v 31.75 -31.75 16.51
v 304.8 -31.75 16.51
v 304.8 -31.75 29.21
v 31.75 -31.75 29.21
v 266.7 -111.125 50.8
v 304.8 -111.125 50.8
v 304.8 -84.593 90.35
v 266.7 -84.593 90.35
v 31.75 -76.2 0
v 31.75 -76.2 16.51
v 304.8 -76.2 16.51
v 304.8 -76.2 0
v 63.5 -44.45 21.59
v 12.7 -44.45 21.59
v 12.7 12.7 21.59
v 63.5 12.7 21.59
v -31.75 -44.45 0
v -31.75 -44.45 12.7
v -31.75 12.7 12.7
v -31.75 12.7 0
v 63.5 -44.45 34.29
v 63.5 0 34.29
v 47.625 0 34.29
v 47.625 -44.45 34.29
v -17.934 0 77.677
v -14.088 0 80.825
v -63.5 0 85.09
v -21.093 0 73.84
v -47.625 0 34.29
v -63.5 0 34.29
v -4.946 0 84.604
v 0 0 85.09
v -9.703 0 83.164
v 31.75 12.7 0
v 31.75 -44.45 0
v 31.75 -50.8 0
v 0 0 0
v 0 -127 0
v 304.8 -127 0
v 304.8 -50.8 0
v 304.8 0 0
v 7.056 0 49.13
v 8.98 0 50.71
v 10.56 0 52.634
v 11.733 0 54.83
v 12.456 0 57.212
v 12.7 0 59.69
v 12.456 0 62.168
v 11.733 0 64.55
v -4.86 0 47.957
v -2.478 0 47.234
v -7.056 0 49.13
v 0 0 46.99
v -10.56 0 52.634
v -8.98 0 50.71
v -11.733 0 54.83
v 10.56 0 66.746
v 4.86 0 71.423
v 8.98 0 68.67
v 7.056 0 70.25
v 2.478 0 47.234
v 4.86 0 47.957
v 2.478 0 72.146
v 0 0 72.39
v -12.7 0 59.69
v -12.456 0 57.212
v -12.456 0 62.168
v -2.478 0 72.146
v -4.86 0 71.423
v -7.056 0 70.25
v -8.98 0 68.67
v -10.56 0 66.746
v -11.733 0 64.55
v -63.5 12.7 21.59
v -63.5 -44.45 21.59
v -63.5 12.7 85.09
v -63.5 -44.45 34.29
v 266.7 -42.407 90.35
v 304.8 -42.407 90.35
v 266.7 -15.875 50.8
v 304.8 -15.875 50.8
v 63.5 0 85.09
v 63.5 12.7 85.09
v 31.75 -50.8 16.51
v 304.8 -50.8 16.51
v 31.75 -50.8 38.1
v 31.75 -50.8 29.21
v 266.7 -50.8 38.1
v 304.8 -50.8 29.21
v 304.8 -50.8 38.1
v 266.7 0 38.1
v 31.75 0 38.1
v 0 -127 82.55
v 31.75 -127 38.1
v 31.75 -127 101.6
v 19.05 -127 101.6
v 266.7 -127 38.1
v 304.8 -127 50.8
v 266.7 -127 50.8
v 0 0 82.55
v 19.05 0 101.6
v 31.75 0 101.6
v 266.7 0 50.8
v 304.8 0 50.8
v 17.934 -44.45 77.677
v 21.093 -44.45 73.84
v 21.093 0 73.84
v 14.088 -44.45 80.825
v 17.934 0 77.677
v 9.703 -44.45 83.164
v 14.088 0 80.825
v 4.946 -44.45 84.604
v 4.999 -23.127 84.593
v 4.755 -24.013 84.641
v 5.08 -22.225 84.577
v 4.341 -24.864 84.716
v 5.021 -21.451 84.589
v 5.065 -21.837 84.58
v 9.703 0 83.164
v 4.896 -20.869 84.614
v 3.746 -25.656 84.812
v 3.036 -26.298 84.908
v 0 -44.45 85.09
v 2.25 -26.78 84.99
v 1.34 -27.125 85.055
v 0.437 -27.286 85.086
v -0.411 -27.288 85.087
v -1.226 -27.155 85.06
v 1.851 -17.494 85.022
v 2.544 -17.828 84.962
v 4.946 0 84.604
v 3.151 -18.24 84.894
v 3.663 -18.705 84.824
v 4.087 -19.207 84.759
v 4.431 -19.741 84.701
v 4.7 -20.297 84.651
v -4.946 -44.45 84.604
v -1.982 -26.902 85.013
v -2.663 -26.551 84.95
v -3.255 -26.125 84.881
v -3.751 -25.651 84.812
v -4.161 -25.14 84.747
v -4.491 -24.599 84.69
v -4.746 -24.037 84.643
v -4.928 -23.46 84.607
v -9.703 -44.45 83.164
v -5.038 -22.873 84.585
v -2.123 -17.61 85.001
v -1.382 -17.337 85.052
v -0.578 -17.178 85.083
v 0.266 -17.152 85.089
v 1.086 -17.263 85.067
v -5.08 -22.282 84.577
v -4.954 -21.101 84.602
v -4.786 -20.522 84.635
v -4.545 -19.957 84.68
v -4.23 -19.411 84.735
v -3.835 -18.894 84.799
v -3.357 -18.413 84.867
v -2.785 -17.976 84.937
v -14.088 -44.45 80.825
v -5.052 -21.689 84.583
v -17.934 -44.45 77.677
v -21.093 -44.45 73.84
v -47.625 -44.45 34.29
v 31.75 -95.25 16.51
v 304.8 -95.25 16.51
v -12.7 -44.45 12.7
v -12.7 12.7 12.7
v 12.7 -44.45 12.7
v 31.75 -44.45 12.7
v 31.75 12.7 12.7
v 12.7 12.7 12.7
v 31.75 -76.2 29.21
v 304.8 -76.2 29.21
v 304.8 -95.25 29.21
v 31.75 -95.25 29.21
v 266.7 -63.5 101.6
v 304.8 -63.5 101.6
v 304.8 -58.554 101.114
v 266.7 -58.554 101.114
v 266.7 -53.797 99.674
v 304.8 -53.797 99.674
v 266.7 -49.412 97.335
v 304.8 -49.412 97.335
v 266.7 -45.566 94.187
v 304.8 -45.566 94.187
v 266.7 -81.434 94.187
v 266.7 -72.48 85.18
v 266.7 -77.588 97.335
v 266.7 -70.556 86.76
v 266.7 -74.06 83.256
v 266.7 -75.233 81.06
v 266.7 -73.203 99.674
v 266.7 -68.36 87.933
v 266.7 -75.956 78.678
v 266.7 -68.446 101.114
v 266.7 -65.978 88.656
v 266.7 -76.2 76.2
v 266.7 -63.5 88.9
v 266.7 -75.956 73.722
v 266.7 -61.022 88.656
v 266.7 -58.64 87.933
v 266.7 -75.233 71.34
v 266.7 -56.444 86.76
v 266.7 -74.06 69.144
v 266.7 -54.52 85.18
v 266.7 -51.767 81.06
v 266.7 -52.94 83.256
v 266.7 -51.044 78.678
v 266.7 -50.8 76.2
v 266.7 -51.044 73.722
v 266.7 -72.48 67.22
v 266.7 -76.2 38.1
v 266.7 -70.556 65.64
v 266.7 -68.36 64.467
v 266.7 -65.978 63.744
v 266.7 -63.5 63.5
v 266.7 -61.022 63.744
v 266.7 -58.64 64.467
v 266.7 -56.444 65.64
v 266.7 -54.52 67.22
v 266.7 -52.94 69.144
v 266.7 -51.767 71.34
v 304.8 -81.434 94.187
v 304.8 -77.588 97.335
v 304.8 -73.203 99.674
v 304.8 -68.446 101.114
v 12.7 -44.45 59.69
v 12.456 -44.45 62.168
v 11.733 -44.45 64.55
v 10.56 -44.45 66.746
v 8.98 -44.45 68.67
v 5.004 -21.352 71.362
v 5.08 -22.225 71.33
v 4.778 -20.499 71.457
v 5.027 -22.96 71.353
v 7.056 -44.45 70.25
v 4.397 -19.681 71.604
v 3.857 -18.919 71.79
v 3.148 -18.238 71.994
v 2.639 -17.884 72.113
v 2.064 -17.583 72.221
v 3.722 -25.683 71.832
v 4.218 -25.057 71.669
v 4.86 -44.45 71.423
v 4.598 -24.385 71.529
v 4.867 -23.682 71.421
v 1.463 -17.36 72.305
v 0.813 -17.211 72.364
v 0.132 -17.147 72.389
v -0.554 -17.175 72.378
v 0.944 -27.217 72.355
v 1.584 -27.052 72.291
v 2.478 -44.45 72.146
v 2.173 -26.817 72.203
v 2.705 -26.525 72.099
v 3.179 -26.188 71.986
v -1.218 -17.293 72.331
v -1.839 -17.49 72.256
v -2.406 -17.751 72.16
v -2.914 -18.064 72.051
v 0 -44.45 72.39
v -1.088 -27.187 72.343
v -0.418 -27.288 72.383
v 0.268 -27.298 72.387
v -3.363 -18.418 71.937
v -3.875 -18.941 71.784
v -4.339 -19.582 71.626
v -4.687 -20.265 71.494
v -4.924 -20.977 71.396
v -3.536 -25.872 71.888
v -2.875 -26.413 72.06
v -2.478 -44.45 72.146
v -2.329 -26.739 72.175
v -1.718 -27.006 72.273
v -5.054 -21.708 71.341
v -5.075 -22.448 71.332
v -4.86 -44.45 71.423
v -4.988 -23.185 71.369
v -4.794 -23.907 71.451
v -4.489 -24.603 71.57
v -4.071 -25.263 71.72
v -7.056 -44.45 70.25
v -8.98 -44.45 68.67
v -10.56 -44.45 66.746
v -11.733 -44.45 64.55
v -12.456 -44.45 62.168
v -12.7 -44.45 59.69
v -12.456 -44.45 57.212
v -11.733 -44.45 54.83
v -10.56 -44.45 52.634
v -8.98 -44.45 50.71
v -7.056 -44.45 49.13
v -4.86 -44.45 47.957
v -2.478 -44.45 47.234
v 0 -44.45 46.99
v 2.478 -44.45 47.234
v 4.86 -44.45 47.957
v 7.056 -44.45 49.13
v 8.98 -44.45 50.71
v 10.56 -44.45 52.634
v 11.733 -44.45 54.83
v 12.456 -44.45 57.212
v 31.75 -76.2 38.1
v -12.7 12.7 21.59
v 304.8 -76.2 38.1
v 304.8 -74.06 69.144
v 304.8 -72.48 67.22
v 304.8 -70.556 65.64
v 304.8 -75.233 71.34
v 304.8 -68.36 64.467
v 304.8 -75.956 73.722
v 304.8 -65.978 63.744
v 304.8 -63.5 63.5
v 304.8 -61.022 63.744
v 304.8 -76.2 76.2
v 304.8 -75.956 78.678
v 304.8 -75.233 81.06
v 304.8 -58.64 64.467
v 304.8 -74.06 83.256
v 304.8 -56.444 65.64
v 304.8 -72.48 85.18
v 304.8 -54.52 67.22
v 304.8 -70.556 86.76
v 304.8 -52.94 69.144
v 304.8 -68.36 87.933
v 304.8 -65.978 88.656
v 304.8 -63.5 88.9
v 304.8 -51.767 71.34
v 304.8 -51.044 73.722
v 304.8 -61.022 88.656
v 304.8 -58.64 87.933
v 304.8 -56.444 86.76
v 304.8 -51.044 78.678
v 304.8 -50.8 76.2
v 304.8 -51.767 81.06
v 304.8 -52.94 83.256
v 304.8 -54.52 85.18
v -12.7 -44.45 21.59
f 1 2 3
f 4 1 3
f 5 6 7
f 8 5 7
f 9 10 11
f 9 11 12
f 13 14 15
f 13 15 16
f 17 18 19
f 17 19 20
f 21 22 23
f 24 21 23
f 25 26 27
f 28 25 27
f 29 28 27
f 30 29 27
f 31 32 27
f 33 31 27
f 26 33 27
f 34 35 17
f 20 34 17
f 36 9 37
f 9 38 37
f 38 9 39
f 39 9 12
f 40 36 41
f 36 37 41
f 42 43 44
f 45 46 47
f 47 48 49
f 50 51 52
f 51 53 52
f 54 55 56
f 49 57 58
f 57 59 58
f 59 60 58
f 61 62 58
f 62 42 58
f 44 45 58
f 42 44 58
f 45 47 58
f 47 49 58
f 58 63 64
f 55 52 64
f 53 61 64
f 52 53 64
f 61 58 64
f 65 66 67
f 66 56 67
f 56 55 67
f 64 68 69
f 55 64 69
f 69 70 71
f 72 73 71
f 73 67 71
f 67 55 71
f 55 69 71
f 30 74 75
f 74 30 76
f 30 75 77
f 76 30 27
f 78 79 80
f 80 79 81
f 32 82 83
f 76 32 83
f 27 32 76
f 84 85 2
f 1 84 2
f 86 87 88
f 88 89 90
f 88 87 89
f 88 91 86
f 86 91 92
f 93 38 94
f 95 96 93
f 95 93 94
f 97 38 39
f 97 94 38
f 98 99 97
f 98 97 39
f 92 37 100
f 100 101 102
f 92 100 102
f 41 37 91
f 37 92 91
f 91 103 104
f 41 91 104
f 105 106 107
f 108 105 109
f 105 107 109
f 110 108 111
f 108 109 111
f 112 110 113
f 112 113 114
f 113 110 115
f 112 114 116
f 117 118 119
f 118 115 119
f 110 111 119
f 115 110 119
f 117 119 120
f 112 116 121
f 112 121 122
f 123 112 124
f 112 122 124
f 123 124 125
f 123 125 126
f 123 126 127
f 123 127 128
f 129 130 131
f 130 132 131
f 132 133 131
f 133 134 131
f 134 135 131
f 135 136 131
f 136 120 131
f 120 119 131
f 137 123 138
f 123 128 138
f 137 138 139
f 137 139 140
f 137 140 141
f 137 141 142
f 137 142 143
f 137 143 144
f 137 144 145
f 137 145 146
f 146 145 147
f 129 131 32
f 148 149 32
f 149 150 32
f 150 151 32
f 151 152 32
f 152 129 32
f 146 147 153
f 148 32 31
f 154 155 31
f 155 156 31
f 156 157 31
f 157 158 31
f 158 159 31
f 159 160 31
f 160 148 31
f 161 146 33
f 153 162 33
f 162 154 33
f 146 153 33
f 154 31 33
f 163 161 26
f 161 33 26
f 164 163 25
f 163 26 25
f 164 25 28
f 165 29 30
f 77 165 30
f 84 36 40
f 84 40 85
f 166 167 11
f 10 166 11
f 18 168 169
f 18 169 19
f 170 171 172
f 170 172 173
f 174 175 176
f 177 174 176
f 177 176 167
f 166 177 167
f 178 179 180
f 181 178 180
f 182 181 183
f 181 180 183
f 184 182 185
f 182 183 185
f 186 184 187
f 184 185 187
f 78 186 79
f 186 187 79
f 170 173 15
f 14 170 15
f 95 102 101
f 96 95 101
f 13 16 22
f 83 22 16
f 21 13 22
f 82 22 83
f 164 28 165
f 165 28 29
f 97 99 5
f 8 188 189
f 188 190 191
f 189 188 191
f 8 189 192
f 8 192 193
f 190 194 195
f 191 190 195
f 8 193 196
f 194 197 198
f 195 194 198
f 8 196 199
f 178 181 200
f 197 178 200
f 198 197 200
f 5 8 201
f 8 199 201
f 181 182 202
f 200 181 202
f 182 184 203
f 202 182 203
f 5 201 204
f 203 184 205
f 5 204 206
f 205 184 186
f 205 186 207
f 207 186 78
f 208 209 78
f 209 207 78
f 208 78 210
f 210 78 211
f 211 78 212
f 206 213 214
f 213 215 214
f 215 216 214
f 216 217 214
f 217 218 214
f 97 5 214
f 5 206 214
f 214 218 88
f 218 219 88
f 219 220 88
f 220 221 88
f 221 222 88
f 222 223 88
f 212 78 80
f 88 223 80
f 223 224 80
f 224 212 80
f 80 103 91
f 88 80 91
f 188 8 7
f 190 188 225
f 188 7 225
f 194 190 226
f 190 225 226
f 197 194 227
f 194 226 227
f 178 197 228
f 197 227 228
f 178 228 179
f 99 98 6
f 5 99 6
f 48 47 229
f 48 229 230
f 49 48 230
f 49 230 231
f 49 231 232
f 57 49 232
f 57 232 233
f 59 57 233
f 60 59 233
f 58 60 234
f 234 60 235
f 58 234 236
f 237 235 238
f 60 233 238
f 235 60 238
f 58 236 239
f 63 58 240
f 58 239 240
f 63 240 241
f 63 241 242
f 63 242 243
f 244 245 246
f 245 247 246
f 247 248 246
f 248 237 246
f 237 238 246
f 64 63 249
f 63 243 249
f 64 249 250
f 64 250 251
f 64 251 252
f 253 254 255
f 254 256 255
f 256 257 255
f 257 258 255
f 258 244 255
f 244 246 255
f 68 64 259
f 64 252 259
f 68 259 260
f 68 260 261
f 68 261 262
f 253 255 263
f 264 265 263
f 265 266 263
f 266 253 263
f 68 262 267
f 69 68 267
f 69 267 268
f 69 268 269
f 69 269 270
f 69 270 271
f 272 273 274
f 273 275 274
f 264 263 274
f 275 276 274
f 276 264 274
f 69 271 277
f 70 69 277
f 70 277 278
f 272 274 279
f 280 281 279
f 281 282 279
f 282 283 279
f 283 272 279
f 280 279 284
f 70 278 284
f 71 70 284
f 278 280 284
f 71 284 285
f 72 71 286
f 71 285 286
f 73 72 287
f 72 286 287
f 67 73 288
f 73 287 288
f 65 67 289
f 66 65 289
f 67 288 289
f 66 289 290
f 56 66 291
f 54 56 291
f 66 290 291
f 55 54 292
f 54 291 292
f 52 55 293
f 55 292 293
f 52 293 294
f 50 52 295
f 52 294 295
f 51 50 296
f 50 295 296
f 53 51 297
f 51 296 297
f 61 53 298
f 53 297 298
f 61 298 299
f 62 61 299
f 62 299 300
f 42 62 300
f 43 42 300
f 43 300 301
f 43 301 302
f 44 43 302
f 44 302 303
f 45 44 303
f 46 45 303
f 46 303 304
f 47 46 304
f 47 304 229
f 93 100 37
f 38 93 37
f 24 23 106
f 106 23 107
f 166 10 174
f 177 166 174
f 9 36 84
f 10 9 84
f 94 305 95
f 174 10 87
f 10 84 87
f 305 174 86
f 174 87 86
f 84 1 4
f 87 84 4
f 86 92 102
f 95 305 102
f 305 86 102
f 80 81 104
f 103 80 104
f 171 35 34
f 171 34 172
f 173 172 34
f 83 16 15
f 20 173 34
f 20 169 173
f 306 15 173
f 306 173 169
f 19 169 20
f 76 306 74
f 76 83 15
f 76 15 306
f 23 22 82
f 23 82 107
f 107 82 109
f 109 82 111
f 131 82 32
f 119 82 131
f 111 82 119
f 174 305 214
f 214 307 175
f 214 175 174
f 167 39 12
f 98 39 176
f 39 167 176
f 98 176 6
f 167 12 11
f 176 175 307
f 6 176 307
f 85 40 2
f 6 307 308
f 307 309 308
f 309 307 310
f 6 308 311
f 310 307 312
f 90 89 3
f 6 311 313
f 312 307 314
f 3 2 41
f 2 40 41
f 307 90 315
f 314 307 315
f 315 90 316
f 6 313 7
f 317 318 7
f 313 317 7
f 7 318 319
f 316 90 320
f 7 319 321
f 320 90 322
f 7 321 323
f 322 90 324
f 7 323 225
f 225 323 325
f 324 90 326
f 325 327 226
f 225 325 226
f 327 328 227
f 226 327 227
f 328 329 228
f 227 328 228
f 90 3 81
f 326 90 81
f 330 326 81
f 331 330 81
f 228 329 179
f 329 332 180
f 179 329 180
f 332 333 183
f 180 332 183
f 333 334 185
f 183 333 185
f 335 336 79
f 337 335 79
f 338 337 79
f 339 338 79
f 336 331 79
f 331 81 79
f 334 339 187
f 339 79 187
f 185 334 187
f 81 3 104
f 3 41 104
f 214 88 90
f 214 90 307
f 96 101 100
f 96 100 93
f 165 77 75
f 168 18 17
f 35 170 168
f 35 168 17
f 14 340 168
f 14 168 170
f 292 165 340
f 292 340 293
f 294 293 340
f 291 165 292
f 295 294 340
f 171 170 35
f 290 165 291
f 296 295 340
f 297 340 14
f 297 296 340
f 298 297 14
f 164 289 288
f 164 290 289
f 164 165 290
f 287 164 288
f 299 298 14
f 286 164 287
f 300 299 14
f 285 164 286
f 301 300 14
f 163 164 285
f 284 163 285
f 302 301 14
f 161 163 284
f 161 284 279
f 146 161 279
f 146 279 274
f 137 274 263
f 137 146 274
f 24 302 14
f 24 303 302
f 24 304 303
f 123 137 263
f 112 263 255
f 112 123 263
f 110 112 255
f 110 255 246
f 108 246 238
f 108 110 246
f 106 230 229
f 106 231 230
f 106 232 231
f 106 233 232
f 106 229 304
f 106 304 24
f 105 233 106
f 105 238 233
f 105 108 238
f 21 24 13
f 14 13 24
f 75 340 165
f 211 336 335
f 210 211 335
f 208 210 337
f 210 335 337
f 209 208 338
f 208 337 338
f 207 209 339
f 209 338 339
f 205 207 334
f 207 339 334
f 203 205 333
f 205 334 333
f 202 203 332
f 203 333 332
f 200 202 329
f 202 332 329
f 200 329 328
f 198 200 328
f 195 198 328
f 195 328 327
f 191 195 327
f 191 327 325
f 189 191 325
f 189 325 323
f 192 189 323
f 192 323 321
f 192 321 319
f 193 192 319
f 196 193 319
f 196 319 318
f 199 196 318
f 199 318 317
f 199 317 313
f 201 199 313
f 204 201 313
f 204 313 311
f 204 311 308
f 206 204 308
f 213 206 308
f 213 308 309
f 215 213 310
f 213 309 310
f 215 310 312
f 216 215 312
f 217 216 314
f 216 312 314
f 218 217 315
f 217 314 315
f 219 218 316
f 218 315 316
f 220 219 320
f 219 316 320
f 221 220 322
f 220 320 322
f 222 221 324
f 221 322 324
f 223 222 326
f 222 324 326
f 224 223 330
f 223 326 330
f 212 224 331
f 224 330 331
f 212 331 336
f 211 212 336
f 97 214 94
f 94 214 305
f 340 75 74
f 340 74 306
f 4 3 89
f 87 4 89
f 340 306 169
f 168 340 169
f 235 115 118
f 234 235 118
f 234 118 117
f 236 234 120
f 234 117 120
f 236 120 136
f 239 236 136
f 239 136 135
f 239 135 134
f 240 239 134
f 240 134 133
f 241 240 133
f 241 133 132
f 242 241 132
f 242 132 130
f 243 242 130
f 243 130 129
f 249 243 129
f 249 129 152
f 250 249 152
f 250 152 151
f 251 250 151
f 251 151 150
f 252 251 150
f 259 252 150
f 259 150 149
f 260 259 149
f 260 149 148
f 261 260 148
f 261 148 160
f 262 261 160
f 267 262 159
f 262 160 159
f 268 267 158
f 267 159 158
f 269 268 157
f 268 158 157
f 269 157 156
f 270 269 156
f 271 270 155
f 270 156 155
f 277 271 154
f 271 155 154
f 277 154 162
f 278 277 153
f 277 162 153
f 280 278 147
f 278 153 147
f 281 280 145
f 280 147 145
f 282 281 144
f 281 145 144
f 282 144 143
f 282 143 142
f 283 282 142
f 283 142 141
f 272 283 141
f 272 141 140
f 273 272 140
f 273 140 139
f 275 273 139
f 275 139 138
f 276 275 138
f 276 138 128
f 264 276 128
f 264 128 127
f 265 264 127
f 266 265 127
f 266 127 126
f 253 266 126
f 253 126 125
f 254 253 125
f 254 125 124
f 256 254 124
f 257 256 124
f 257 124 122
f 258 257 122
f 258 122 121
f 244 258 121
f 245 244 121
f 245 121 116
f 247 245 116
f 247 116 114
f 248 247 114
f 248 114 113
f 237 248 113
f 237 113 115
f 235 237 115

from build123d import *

# Parameters (mm, degrees)
F1_DEPTH  = 127
F2_SIZE2  = 19.05
F2_SIZE   = 19.05
F4_DEPTH  = 50.8
F5_R      = 12.7
F6_DEPTH  = 50.8
F8_DEPTH  = 273.05
F10_DEPTH = 44.45
F11_R     = 12.7
F12_DEPTH = 44.45
F13_W     = 127
F13_H     = 85.09
F14_DEPTH = 12.7
F16_DEPTH = 12.7
F18_R     = 5.08
F19_DEPTH = 25.4


with BuildPart() as f1:
    # F0 (on Front) → F1 (new body)
    with BuildSketch(Plane.XZ):
        Polygon((0, 101.6), (0, 0), (304.8, 0), (304.8, 101.6), (266.7, 101.6), (266.7, 38.1), (31.75, 38.1), (31.75, 101.6), align=None)
    extrude(amount=F1_DEPTH)

    # F2
    f2_edges = [f1.edges().sort_by_distance(p)[0] for p in [
        (0, -63.5, 101.6),
    ]]
    chamfer(f2_edges, length=F2_SIZE, length2=F2_SIZE2)

    # F3 (on face) → F4 (cut)
    with BuildSketch(Plane.YZ.offset(304.8)):
        with BuildLine():
            Line((-127, 101.6), (-127, 50.8))
            Line((-127, 50.8), (-111.125, 50.8))
            Line((-111.125, 50.8), (-84.5934256055, 90.3501730104))
            ThreePointArc((-84.5934256055, 90.3501730104), (-75.4529411765, 98.6117647059), (-63.5, 101.6))
            Line((-63.5, 101.6), (-127, 101.6))
        make_face()
        with BuildLine():
            Line((0, 101.6), (-63.5, 101.6))
            ThreePointArc((-63.5, 101.6), (-51.5470588235, 98.6117647059), (-42.4065743945, 90.3501730104))
            Line((-42.4065743945, 90.3501730104), (-15.875, 50.8))
            Line((-15.875, 50.8), (0, 50.8))
            Line((0, 50.8), (0, 101.6))
        make_face()
    extrude(amount=-F4_DEPTH, mode=Mode.SUBTRACT)

    # F5 (on face) → F6 (cut)
    with BuildSketch(Plane.YZ.offset(304.8)):
        with Locations((-63.5, 76.2)):
            Circle(F5_R)
    extrude(amount=-F6_DEPTH, mode=Mode.SUBTRACT)

    # F7 (on face) → F8 (cut, through all)
    with BuildSketch(Plane.YZ.offset(304.8)):
        Polygon((-76.2, 16.51), (-76.2, 0), (-50.8, 0), (-50.8, 16.51), (-31.75, 16.51), (-31.75, 29.21), (-50.8, 29.21), (-50.8, 38.1), (-76.2, 38.1), (-76.2, 29.21), (-95.25, 29.21), (-95.25, 16.51), align=None)
    extrude(amount=-F8_DEPTH, mode=Mode.SUBTRACT)


with BuildPart() as f10:
    # F9 (on Front) → F10 (new body)
    with BuildSketch(Plane.XZ):
        with BuildLine():
            Line((-31.75, 12.7), (-31.75, 0))
            Line((-31.75, 0), (31.75, 0))
            Line((31.75, 0), (31.75, 12.7))
            Line((31.75, 12.7), (12.7, 12.7))
            Line((12.7, 12.7), (12.7, 21.59))
            Line((12.7, 21.59), (63.5, 21.59))
            Line((63.5, 21.59), (63.5, 34.29))
            Line((63.5, 34.29), (47.625, 34.29))
            Line((47.625, 34.29), (21.0934256055, 73.8401730104))
            ThreePointArc((21.0934256055, 73.8401730104), (0, 85.09), (-21.0934256055, 73.8401730104))
            Line((-21.0934256055, 73.8401730104), (-47.625, 34.29))
            Line((-47.625, 34.29), (-63.5, 34.29))
            Line((-63.5, 34.29), (-63.5, 21.59))
            Line((-63.5, 21.59), (-12.7, 21.59))
            Line((-12.7, 21.59), (-12.7, 12.7))
            Line((-12.7, 12.7), (-31.75, 12.7))
        make_face()
    extrude(amount=F10_DEPTH)

    # F11 (on face) → F12 (cut)
    with BuildSketch(Plane.XZ.offset(44.45)):
        with Locations((0, 59.69)):
            Circle(F11_R)
    extrude(amount=-F12_DEPTH, mode=Mode.SUBTRACT)

    # F13 (on face) → F14 (join)
    with BuildSketch(Plane(origin=(0, 0, 0), x_dir=(-1, 0, 0), z_dir=(0, 1, 0))):
        with Locations((0, 42.545)):
            Rectangle(F13_W, F13_H)
    extrude(amount=F14_DEPTH)

    # F15 (on face) → F16 (cut)
    with BuildSketch(Plane(origin=(0, 12.7, 0), x_dir=(-1, 0, 0), z_dir=(0, 1, 0))):
        Polygon((-63.5, 21.59), (-63.5, 0), (-31.75, 0), (-31.75, 12.7), (-12.7, 12.7), (-12.7, 21.59), align=None)
        Polygon((63.5, 21.59), (12.7, 21.59), (12.7, 12.7), (31.75, 12.7), (31.75, 0), (63.5, 0), align=None)
    extrude(amount=-F16_DEPTH, mode=Mode.SUBTRACT)

    # F18 (on offset) → F19 (cut)
    with BuildSketch(Plane.XY.offset(85.09)):
        with Locations((0, -22.225)):
            Circle(F18_R)
    extrude(amount=-F19_DEPTH, mode=Mode.SUBTRACT)


solid = Compound([f1.part, f10.part])
